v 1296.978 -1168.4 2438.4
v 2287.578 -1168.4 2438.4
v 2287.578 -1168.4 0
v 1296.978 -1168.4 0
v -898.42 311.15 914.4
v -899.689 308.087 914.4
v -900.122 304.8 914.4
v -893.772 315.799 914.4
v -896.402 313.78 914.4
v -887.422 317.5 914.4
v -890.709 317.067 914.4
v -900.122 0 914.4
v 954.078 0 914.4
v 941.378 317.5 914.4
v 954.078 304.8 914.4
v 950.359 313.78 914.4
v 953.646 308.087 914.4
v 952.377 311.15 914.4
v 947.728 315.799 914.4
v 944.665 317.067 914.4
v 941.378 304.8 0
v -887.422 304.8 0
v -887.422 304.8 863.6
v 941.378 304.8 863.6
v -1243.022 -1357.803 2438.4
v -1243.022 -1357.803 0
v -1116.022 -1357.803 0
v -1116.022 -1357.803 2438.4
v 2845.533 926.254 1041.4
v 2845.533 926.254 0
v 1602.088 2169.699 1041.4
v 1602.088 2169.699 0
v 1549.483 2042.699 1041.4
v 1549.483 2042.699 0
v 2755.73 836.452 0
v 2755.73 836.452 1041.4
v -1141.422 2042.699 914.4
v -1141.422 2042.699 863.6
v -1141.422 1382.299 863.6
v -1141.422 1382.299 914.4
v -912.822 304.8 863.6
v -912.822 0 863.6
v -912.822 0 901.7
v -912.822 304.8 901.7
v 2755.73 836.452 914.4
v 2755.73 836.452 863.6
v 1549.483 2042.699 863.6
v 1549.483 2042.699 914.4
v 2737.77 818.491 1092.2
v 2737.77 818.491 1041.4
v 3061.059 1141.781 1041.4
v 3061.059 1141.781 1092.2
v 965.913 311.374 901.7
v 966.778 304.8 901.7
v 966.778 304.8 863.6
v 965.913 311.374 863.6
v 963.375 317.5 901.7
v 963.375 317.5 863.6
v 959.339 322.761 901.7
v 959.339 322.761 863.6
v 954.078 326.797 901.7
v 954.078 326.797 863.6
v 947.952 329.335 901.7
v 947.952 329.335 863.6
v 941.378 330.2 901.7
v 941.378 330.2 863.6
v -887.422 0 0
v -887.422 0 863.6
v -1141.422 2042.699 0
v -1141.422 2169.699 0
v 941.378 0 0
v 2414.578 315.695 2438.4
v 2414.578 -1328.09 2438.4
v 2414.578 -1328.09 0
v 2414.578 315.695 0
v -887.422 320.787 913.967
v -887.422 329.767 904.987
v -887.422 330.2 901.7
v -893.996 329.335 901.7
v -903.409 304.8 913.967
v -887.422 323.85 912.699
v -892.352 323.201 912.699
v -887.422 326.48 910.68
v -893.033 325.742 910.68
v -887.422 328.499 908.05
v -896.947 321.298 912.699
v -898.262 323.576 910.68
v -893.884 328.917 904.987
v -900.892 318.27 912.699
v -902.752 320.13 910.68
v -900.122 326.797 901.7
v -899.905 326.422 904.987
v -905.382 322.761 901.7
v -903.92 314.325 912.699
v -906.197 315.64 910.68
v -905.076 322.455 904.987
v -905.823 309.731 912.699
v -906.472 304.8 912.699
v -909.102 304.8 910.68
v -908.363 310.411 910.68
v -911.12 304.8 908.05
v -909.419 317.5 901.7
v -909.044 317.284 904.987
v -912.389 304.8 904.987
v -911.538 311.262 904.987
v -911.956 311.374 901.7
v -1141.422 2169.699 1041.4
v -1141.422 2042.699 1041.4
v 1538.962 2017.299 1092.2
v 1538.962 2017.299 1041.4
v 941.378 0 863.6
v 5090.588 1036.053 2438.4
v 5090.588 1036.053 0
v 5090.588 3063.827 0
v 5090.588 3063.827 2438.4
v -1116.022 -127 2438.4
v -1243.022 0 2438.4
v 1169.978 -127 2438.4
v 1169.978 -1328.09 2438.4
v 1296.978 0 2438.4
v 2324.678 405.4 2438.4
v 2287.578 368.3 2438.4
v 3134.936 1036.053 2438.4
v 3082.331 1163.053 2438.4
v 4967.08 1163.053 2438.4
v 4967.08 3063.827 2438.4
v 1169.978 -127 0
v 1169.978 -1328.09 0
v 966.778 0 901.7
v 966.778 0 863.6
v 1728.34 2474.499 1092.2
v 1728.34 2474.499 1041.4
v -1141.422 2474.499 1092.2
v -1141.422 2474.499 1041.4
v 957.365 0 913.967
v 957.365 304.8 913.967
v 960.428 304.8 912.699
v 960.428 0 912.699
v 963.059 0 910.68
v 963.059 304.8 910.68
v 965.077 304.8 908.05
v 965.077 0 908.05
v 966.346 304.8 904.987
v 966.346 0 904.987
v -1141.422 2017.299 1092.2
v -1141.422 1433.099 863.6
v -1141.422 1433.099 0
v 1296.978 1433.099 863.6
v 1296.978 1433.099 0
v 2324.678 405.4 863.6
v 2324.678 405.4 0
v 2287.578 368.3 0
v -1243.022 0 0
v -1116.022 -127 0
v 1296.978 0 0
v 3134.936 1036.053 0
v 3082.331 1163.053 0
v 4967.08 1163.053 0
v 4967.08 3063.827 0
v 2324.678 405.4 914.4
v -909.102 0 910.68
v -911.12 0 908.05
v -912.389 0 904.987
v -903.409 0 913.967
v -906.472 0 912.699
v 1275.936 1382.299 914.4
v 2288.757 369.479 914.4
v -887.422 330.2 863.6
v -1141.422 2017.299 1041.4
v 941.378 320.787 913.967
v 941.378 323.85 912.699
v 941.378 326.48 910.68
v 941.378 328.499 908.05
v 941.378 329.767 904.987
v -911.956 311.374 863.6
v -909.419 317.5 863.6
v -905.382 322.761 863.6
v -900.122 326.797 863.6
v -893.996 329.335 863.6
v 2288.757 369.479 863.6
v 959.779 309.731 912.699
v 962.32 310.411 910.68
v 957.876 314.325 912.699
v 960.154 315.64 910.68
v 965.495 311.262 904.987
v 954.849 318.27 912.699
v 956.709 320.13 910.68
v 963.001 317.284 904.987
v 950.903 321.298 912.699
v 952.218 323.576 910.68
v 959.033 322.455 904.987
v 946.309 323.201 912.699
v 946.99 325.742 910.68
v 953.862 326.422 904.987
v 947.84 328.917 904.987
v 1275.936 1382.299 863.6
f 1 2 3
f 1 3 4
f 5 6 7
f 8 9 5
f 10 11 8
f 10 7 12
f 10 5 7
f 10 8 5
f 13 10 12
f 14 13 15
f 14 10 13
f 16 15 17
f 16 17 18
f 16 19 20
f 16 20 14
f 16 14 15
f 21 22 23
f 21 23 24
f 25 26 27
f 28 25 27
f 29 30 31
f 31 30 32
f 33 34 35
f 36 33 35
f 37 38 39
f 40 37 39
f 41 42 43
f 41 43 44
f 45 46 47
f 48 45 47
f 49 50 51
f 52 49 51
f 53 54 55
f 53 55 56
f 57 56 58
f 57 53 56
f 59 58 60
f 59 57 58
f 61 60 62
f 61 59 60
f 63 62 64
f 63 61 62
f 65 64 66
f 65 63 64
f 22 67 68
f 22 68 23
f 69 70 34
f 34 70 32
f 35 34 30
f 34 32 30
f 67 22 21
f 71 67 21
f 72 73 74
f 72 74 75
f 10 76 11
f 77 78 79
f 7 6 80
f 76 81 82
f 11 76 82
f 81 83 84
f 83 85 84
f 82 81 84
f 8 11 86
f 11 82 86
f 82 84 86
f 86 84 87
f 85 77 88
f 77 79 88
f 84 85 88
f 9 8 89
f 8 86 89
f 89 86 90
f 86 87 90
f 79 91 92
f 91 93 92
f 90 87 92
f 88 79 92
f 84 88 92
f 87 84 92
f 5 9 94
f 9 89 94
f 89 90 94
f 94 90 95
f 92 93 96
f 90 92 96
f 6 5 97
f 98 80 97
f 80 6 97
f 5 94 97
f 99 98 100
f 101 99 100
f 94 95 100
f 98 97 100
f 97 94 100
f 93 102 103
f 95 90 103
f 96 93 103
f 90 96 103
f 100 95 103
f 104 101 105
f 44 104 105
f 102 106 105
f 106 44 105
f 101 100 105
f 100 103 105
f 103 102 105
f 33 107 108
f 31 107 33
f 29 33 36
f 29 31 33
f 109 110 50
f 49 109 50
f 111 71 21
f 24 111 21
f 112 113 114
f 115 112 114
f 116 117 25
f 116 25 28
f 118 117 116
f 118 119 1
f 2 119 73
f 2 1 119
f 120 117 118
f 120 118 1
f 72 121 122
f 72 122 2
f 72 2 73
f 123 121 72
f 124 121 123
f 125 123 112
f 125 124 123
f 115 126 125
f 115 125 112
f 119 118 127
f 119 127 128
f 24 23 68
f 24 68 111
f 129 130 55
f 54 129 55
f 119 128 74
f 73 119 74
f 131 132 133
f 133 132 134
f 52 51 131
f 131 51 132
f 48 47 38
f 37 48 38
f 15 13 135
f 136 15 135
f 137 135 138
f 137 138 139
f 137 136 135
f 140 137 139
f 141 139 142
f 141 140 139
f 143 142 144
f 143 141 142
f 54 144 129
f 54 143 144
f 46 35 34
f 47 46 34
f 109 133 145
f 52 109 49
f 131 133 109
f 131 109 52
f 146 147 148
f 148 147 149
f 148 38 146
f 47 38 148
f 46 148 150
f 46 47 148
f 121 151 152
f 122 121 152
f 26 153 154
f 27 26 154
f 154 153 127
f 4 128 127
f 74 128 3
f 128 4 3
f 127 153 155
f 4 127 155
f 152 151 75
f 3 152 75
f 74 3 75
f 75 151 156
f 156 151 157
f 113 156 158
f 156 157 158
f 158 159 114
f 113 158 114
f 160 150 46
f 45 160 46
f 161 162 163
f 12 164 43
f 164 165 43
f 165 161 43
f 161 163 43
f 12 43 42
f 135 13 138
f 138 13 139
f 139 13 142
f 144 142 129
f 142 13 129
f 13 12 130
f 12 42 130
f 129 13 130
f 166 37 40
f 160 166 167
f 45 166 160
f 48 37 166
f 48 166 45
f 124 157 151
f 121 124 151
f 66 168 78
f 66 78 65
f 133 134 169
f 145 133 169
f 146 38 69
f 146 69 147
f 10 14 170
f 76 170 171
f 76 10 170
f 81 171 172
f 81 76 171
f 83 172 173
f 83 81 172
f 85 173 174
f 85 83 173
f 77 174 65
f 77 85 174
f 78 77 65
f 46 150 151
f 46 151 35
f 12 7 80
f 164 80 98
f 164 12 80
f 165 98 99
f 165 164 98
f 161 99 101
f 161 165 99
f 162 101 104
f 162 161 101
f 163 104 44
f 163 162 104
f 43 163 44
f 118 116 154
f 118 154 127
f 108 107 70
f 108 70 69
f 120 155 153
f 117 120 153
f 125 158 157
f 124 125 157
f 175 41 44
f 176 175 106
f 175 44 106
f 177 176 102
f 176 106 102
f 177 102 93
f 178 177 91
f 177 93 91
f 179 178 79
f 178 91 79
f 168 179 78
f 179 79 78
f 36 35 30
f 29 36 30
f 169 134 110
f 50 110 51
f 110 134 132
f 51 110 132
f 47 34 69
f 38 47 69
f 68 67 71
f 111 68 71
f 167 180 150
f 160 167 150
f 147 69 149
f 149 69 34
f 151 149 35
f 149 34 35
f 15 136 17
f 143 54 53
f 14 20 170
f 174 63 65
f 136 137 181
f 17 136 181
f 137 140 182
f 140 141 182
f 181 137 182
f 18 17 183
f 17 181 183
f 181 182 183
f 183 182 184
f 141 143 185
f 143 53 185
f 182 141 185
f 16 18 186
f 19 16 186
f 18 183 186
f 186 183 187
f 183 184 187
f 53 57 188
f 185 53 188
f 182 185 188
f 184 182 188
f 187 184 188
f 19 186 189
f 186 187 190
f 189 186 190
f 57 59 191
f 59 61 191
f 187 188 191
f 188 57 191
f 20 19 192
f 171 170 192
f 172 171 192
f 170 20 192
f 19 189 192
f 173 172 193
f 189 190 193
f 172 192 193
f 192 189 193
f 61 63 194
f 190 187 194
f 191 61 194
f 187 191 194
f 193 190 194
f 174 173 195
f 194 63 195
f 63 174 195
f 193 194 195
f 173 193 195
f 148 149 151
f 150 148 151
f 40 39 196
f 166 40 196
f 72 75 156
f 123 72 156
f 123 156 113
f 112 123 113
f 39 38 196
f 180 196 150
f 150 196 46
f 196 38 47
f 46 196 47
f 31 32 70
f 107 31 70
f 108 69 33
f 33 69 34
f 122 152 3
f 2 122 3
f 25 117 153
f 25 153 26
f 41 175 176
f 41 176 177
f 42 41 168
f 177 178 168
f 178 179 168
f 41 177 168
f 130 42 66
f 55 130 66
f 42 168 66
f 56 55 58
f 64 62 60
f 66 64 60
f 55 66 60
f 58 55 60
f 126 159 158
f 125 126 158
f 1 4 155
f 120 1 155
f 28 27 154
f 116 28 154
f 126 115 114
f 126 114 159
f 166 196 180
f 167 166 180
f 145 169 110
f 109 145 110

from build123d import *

# Parameters (mm, degrees)
F1_DEPTH = 863.6
F0_W     = 1828.8
F0_H     = 304.8
F2_DEPTH = 2438.4
F3_DEPTH = 1041.4
F5_DEPTH = 50.8
F6_W     = 1879.6
F6_H     = 330.2
F7_DEPTH = 50.8
F8_R     = 25.4
F9_R     = 12.7


with BuildPart() as f1:
    # F0 (on Top) → F1 (new body)
    with BuildSketch(Plane.XY):
        Polygon((1296.9782733917, 1433.0991125107), (2324.6778296471, 405.3995562553), (2755.7301234584, 836.4518500667), (1549.4828610144, 2042.6991125107), (-1141.4217266083, 2042.6991125107), (-1141.4217266083, 1433.0991125107), align=None)
    extrude(amount=F1_DEPTH)


with BuildPart() as f1b:
    # F0 (on Top) → F1, piece 2 (new body)
    with BuildSketch(Plane.XY):
        with Locations((26.9782733917, 152.4)):
            Rectangle(F0_W, F0_H)
    extrude(amount=F1_DEPTH)


with BuildPart() as f2:
    # F0 (on Top) → F2 (new body)
    with BuildSketch(Plane.XY):
        Polygon((-887.4217266083, 0), (-1243.0217266083, 0), (-1243.0217266083, -1357.8029119428), (-1116.0217266083, -1357.8029119428), (-1116.0217266083, -127), (1169.9782733917, -127), (1169.9782733917, -1328.09007782), (2414.5782733917, -1328.09007782), (2414.5782733917, 315.6948775786), (3134.9360625277, 1036.0526667146), (5090.587792672, 1036.0526667146), (5090.587792672, 3063.8273026744), (4967.0795944628, 3063.8273026744), (4967.0795944628, 1163.0526667146), (3082.3309401063, 1163.0526667146), (3061.0588315747, 1141.780558183), (2845.5326846691, 926.2544112774), (2755.7301234584, 836.4518500667), (2324.6778296471, 405.3995562553), (2287.5782733917, 368.3), (2287.5782733917, -1168.4), (1296.9782733917, -1168.4), (1296.9782733917, 0), (941.3782733917, 0), align=None)
    extrude(amount=F2_DEPTH)


with BuildPart() as f3:
    # F0 (on Top) → F3 (new body)
    with BuildSketch(Plane.XY):
        Polygon((1549.4828610144, 2042.6991125107), (2755.7301234584, 836.4518500667), (2845.5326846691, 926.2544112774), (1602.0879834357, 2169.6991125107), (-1141.4217266083, 2169.6991125107), (-1141.4217266083, 2042.6991125107), align=None)
    extrude(amount=F3_DEPTH)


with BuildPart() as f5:
    # F4 (on face) → F5 (new body)
    with BuildSketch(Plane.XY.offset(1041.4)):
        Polygon((1538.9618365301, 2017.2991125107), (2737.7696112162, 818.4913378245), (3061.0588315747, 1141.780558183), (1728.3402772471, 2474.4991125107), (-1141.4217266083, 2474.4991125107), (-1141.4217266083, 2017.2991125107), align=None)
    extrude(amount=F5_DEPTH)


with BuildPart() as f7:
    # F6 (on face) → F7 (new body)
    with BuildSketch(Plane.XY.offset(863.6)):
        with Locations((26.9782733917, 165.1)):
            Rectangle(F6_W, F6_H)
    extrude(amount=F7_DEPTH)

    # F8
    f8_edges = [f7.edges().sort_by_distance(p)[0] for p in [
        (-912.821727, 330.2, 889),
        (966.778273, 330.2, 889),
    ]]
    fillet(f8_edges, radius=F8_R)

    # F9
    f9_edges = [f7.edges().sort_by_distance(p)[0] for p in [
        (966.778273, 152.4, 914.4),
        (26.978273, 330.2, 914.4),
    ]]
    fillet(f9_edges, radius=F9_R)


with BuildPart() as f7b:
    # F6 (on face) → F7, piece 2 (new body)
    with BuildSketch(Plane.XY.offset(863.6)):
        Polygon((2324.6778296471, 405.3995562553), (2755.7301234584, 836.4518500667), (1549.4828610144, 2042.6991125107), (-1141.4217266083, 2042.6991125107), (-1141.4217266083, 1433.0991125107), (1296.9782733917, 1433.0991125107), align=None)
        Polygon((2288.7568051628, 369.4785317711), (2324.6778296471, 405.3995562553), (1296.9782733917, 1433.0991125107), (-1141.4217266083, 1433.0991125107), (-1141.4217266083, 1382.2991125107), (1275.9362244232, 1382.2991125107), align=None)
    extrude(amount=F7_DEPTH)


solid = Compound([f1.part, f1b.part, f2.part, f3.part, f5.part, f7.part, f7b.part])
